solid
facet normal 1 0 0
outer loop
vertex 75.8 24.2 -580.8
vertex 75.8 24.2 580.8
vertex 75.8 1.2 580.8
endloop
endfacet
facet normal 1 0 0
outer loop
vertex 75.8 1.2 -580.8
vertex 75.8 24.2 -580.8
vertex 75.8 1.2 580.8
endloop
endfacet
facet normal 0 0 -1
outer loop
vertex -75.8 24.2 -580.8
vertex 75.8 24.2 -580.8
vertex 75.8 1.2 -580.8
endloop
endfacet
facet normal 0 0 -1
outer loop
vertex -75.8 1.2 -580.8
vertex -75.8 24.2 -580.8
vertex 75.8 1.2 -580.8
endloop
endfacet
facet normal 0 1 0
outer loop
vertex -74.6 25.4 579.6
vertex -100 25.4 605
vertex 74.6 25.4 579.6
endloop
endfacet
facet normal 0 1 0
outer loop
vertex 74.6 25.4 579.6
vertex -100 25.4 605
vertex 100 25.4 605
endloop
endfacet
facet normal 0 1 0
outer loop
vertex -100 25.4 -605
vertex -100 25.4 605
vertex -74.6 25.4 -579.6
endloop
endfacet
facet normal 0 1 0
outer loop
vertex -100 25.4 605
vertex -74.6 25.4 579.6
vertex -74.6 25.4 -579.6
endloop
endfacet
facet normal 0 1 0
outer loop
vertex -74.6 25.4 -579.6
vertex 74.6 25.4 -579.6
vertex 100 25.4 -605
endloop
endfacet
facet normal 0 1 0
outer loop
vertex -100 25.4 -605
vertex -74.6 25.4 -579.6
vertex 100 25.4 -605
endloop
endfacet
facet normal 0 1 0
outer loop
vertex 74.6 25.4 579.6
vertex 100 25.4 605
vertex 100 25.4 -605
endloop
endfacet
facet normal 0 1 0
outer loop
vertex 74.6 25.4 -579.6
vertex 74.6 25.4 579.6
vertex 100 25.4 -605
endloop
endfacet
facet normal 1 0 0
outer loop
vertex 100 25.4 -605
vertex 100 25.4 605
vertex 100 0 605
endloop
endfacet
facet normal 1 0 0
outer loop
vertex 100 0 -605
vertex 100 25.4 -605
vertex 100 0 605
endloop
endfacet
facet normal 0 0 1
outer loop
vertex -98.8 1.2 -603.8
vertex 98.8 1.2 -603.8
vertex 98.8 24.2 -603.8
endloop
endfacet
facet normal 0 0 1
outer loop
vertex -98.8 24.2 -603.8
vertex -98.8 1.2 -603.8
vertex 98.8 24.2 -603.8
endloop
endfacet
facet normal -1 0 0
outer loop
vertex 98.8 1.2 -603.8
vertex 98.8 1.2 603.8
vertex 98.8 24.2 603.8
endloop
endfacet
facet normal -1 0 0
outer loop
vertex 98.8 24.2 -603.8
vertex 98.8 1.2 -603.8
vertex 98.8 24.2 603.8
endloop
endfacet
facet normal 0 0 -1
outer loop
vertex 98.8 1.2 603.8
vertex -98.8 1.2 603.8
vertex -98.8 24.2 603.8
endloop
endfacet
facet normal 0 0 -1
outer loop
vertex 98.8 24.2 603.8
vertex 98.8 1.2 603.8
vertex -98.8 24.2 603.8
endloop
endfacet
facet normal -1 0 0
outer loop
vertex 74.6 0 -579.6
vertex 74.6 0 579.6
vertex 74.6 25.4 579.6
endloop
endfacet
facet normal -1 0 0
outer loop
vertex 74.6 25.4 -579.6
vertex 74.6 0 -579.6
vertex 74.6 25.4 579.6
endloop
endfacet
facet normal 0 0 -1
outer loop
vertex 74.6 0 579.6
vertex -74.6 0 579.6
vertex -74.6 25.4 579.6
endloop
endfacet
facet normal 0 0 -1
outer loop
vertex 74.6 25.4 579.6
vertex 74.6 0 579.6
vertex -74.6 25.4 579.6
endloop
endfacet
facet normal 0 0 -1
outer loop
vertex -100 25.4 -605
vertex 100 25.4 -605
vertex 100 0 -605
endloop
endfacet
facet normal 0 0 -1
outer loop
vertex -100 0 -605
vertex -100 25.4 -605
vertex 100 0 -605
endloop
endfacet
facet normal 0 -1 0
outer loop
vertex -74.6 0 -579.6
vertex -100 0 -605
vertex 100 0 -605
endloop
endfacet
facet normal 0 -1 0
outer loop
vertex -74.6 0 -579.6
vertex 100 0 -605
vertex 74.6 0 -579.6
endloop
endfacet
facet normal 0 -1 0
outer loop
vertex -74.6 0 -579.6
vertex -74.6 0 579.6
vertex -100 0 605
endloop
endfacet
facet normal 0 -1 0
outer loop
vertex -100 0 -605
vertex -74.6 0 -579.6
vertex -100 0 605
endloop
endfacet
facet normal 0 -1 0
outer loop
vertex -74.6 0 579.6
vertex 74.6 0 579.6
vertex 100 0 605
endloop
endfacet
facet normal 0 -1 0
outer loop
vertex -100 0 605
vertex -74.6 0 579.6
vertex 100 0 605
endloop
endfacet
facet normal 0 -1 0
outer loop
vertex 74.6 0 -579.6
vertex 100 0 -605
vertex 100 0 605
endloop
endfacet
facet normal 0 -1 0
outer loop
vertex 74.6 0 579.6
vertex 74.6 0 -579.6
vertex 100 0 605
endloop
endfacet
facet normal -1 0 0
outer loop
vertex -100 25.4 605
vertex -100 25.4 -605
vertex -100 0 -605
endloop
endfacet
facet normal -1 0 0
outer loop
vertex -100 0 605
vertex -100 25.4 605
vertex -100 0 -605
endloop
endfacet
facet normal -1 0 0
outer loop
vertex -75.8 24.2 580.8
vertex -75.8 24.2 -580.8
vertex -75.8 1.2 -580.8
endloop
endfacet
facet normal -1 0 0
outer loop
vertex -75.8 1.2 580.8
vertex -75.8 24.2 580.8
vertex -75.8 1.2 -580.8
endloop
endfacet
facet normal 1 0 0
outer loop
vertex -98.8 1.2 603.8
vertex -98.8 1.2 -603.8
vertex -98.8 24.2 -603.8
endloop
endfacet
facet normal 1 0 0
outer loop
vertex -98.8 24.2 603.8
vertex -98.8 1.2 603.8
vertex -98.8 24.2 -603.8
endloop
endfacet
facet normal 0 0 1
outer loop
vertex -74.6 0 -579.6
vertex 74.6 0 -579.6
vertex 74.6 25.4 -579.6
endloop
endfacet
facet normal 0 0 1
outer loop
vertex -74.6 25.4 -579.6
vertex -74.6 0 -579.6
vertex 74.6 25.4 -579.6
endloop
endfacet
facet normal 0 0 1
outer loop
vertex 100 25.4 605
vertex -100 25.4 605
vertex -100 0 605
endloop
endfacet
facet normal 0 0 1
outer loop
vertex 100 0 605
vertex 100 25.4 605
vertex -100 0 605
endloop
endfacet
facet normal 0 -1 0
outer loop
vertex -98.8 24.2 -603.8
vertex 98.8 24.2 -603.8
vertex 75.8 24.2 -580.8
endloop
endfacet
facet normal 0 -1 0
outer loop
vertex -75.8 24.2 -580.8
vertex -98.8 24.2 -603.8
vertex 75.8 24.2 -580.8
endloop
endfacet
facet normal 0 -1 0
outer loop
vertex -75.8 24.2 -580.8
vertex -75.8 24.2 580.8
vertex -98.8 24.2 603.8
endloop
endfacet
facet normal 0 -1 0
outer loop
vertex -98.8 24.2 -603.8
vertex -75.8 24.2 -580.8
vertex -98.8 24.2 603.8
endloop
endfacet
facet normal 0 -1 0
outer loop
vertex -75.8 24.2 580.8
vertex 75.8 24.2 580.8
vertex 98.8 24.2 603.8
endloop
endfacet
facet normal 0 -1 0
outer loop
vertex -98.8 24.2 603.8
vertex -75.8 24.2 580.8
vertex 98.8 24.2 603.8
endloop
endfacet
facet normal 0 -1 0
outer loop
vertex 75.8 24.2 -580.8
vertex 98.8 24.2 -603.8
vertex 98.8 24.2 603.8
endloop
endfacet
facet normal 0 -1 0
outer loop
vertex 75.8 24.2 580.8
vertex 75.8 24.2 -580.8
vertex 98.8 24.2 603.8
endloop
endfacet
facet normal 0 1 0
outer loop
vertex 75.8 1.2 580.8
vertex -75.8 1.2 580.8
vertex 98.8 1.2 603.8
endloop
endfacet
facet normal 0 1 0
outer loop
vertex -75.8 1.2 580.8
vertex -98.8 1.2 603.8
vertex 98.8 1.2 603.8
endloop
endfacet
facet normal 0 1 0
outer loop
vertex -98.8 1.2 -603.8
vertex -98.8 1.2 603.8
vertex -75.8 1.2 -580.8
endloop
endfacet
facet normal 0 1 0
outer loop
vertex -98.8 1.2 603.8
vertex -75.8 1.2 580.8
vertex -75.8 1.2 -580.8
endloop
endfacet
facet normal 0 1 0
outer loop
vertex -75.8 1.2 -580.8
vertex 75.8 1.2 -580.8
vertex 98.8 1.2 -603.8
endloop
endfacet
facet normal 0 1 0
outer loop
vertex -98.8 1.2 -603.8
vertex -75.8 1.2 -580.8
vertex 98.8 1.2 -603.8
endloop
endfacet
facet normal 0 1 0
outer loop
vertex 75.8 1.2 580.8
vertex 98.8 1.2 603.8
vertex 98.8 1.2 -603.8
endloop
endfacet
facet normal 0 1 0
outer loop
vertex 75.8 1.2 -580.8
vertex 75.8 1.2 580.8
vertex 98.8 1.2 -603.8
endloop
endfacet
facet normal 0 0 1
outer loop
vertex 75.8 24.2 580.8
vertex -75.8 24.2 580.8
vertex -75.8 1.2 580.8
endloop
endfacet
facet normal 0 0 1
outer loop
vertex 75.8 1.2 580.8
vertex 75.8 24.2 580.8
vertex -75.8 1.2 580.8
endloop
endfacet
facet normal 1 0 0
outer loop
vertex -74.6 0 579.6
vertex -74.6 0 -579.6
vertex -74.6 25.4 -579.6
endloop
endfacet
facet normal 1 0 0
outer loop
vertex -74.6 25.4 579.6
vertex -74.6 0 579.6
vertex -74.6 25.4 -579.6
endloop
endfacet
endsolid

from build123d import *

# Parameters (mm, degrees)
SKETCH2_W   = 25.4
SKETCH2_H   = 25.4
SKETCH2_W_2 = 23
SKETCH2_H_2 = 23


with BuildPart() as part:
    # Sweep1: sweep along a path in Sketch1
    with BuildLine(Plane(origin=(0, 0, 0), x_dir=(1, 0, 0), z_dir=(0, 1, 0))) as sweep1_path:
        Line((-100, 605), (100, 605))
        Line((100, 605), (100, -605))
        Line((100, -605), (-100, -605))
        Line((-100, -605), (-100, 605))
    # Sketch2 → Sweep1 (sweep)
    with BuildSketch(Plane(origin=(0, 0, 0), x_dir=(0, 0, -1), z_dir=(1, 0, 0))):
        with Locations((-592.3, 12.7)):
            Rectangle(SKETCH2_W, SKETCH2_H)
        with Locations((-592.3, 12.7)):
            Rectangle(SKETCH2_W_2, SKETCH2_H_2, mode=Mode.SUBTRACT)
    sweep(path=sweep1_path.line, transition=Transition.RIGHT)


solid = part.part
